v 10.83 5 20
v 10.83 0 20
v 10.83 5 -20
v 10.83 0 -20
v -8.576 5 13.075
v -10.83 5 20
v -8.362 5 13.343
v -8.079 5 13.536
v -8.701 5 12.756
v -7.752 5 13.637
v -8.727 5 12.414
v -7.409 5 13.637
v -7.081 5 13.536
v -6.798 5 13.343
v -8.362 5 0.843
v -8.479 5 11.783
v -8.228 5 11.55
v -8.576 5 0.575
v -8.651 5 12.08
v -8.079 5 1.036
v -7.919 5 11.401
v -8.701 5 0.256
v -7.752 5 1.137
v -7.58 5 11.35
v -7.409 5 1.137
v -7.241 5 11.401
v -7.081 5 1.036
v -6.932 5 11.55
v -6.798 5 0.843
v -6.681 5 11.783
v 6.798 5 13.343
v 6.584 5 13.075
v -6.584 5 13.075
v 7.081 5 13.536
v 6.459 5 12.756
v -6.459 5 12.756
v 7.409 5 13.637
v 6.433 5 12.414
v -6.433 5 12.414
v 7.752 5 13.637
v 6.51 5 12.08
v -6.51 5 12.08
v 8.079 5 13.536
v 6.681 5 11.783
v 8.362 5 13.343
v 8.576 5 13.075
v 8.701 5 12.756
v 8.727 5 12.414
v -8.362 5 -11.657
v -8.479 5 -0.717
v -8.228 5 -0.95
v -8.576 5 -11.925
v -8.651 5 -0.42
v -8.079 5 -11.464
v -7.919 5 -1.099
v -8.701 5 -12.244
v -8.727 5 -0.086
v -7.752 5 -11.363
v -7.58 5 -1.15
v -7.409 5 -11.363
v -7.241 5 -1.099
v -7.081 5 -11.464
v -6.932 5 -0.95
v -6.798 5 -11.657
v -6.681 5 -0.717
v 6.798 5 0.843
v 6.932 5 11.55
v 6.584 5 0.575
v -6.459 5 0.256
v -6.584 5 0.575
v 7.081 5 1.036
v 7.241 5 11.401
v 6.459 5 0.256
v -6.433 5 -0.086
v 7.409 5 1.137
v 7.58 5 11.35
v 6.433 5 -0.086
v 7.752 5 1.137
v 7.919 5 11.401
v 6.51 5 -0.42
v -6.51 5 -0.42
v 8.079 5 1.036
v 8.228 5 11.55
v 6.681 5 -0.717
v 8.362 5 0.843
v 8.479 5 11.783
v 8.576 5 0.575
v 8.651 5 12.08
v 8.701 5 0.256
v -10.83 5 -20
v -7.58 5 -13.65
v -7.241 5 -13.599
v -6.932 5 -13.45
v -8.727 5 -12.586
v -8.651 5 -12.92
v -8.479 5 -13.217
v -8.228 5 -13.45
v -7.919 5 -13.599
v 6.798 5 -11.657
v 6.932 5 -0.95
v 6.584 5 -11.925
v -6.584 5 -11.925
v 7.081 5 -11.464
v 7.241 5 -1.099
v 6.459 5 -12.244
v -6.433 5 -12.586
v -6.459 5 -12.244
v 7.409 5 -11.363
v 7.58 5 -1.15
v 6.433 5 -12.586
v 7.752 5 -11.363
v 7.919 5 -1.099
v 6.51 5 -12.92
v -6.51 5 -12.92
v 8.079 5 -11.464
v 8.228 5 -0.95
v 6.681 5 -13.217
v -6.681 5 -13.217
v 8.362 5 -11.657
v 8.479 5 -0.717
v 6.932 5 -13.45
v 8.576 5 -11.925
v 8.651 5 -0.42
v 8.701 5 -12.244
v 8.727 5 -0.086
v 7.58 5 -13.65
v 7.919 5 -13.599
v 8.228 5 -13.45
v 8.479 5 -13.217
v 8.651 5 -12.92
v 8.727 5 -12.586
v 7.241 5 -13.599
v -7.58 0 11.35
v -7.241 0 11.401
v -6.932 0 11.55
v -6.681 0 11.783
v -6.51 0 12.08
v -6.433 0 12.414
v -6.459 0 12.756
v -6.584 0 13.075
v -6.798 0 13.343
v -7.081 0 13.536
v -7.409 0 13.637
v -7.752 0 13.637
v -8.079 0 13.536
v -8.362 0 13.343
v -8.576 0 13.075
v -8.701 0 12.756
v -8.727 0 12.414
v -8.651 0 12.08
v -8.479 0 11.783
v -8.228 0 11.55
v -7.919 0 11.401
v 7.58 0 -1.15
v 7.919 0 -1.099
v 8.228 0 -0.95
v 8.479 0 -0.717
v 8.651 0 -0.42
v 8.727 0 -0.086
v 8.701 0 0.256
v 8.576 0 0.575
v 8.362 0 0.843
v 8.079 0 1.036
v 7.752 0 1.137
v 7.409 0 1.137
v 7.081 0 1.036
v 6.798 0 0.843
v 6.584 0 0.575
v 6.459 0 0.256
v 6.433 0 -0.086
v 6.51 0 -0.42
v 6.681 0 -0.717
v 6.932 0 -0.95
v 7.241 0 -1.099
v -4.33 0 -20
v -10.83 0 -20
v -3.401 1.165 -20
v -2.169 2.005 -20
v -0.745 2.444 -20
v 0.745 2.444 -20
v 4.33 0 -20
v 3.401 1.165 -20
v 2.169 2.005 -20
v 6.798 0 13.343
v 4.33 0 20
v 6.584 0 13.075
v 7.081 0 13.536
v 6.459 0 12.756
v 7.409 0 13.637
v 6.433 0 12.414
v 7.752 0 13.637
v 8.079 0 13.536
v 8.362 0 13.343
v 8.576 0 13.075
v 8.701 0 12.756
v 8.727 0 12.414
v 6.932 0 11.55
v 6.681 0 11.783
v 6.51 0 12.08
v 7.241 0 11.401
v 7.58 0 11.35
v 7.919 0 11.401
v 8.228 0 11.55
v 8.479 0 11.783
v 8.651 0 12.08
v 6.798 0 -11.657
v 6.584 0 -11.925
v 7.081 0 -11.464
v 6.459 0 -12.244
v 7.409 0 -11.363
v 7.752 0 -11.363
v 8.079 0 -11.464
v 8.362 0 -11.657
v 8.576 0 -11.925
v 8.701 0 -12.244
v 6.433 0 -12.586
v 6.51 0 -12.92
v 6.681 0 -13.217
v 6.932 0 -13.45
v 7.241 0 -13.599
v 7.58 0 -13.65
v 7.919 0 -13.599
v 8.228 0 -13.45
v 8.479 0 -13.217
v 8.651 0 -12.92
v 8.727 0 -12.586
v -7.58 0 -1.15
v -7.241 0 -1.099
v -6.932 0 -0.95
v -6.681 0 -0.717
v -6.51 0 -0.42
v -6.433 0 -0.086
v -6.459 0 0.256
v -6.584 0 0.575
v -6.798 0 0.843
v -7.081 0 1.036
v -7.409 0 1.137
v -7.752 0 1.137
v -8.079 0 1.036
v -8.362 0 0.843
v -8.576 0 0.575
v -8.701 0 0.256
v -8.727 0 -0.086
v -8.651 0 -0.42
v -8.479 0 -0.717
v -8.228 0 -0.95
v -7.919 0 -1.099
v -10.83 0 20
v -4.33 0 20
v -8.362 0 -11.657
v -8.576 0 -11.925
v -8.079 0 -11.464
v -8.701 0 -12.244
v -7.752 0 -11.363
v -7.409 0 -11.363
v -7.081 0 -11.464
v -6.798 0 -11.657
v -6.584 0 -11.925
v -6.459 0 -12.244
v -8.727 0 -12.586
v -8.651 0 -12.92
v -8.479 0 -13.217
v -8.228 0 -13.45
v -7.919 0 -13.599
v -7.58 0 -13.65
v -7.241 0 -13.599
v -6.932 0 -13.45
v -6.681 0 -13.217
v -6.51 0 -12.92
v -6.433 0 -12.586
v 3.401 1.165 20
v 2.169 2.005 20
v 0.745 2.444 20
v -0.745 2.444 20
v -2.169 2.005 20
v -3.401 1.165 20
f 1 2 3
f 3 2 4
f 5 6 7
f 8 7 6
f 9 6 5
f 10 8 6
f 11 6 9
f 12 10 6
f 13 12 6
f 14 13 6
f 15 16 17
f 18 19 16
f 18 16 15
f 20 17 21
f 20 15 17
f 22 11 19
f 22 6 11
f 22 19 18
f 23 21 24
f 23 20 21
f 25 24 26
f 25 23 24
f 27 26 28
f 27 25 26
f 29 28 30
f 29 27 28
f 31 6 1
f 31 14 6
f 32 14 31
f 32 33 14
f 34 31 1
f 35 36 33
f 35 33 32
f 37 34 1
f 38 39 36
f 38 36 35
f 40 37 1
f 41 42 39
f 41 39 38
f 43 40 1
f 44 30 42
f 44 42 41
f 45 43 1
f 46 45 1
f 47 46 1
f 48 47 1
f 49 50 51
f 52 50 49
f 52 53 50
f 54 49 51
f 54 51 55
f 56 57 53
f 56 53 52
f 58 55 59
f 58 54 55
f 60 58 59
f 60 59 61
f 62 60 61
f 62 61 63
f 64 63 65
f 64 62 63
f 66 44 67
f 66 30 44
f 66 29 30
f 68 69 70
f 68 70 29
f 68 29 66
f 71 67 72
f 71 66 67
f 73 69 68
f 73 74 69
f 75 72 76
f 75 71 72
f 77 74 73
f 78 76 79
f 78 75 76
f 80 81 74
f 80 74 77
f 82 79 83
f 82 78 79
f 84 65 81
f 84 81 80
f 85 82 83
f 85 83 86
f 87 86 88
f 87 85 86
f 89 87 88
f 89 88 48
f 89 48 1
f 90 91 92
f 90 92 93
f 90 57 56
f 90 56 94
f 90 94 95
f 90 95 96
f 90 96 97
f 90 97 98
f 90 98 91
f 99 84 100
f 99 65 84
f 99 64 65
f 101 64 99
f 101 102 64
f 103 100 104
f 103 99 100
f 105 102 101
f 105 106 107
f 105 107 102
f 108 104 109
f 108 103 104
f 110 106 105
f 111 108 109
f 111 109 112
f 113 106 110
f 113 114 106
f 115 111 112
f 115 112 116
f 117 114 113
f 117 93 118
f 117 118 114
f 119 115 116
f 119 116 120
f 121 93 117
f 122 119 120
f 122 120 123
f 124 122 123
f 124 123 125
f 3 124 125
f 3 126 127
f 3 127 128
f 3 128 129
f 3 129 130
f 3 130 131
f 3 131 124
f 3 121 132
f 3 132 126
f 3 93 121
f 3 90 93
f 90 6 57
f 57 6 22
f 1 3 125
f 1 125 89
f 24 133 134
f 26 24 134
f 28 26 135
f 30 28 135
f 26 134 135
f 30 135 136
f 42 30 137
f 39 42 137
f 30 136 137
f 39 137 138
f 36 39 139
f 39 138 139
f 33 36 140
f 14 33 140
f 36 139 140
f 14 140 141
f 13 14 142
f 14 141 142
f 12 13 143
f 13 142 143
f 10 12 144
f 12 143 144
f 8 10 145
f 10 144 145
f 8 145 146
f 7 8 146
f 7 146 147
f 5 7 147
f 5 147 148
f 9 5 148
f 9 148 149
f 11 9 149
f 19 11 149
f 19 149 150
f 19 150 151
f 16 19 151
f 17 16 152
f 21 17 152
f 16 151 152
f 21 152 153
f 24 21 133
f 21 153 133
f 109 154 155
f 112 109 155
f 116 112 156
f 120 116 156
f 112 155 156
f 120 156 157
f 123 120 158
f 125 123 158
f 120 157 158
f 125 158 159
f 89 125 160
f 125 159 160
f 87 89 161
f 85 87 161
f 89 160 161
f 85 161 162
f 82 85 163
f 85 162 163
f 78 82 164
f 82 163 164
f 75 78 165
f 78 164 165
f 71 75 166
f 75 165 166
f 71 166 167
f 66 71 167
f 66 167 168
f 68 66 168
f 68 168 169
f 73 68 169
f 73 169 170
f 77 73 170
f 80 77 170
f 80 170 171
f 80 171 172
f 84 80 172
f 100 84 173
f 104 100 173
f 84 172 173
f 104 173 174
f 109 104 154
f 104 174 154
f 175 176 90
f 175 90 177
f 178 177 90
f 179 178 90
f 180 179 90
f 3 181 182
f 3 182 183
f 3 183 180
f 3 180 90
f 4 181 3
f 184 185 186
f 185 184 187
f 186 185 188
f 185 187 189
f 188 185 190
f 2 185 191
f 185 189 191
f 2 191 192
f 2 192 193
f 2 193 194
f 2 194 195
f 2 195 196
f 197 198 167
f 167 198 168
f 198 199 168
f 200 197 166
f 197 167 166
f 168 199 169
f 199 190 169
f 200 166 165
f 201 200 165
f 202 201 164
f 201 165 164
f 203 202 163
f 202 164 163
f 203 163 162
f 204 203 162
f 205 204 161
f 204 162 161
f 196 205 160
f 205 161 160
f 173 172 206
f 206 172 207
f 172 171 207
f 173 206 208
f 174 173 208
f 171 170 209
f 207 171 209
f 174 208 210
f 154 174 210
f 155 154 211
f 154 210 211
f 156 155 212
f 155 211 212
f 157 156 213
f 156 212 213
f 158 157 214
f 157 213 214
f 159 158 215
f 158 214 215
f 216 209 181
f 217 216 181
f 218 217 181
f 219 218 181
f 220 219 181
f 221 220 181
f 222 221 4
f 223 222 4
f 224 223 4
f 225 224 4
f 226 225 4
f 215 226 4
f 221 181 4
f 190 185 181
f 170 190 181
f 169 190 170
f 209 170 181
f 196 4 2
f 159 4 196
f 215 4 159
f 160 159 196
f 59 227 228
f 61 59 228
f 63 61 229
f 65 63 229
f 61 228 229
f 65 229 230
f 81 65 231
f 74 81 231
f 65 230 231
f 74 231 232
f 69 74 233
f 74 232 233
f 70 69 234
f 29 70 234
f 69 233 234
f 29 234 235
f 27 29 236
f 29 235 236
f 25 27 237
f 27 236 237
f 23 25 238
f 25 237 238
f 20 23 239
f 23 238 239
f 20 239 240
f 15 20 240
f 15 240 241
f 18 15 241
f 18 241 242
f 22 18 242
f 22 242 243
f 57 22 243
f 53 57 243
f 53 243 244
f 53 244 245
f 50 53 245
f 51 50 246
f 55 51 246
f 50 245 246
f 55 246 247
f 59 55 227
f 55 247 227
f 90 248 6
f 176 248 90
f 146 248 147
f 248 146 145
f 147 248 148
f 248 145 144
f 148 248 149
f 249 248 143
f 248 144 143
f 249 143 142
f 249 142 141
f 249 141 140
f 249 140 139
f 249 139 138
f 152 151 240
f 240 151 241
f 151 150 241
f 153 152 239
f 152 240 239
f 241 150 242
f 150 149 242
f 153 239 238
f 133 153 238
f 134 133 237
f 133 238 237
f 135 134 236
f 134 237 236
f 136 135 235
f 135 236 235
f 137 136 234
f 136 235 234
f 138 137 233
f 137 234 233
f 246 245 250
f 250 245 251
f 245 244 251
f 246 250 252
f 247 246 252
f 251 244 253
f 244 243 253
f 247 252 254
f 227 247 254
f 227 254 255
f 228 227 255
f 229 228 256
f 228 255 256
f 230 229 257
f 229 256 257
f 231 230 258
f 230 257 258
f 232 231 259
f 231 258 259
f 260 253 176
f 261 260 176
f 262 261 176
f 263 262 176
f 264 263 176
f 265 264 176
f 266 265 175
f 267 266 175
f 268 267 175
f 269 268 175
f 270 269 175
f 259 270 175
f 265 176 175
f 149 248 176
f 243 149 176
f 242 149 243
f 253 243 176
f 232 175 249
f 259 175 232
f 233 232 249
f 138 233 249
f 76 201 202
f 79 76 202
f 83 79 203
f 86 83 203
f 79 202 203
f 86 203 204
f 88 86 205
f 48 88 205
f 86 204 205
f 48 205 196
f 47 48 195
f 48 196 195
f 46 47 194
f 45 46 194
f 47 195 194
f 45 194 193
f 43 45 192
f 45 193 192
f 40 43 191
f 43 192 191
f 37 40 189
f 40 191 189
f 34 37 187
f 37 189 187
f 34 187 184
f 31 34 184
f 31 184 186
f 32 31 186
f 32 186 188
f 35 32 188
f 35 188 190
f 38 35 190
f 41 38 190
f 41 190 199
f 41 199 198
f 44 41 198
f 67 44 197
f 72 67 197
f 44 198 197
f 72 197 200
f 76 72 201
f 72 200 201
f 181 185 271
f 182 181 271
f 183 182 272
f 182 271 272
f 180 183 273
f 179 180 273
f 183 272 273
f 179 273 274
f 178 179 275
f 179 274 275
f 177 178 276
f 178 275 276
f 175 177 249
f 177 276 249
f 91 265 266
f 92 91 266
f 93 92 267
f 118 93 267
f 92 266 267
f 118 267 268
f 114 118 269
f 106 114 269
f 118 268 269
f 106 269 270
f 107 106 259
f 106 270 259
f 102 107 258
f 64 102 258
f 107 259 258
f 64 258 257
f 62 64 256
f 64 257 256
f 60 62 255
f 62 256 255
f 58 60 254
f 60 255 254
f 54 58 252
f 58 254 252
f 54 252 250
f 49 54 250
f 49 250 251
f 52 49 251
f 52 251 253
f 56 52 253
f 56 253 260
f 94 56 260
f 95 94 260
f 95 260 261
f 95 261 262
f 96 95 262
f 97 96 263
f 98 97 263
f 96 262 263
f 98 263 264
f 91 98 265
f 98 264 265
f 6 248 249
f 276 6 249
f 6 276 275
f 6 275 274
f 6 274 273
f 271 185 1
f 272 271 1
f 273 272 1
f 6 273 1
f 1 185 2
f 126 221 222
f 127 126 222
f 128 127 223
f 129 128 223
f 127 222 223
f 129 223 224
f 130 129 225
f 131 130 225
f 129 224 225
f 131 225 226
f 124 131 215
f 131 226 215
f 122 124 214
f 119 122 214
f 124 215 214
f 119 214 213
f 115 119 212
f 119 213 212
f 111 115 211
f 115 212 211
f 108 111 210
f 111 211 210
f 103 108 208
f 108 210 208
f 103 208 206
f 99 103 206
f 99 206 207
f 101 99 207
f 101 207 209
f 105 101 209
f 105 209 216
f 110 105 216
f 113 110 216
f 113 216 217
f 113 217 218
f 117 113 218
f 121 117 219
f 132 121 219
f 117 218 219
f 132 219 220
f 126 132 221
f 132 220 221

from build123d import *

# Parameters (mm, degrees)
SKETCH_1_W          = 21.66025404
SKETCH_1_H          = 40
EXTRUDE_1_DEPTH     = 5
CUT_EXTRUDE_1_DEPTH = 40
SKETCH_3_R          = 1.15
CUT_EXTRUDE_2_DEPTH = 5


with BuildPart() as part:
    # Эскиз1 → Бобышка-Вытянуть1 (new body)
    with BuildSketch(Plane(origin=(0, 0, 0), x_dir=(1, 0, 0), z_dir=(0, 1, 0))):
        Rectangle(SKETCH_1_W, SKETCH_1_H)
    extrude(amount=EXTRUDE_1_DEPTH)

    # Эскиз2 → Вырез-Вытянуть1 (cut)
    with BuildSketch(Plane.XY.offset(20)):
        with BuildLine():
            Line((-4.33012702, 0), (4.33012702, 0))
            ThreePointArc((4.33012702, 0), (0, 2.500000002), (-4.33012702, 0))
        make_face()
    extrude(amount=-CUT_EXTRUDE_1_DEPTH, mode=Mode.SUBTRACT)

    # Эскиз3 → Вырез-Вытянуть2 (cut)
    with BuildSketch(Plane.XZ):
        with Locations(Location((7.58012702, 12.5, 0), (0, 0, 270))):
            Circle(SKETCH_3_R)
        with Locations(Location((7.58012702, -12.5, 0), (0, 0, 270))):
            Circle(SKETCH_3_R)
        with Locations(Location((7.58012702, 0, 0), (0, 0, 270))):
            Circle(SKETCH_3_R)
        with Locations(Location((-7.58012702, -12.5, 0), (0, 0, 270))):
            Circle(SKETCH_3_R)
        with Locations(Location((-7.58012702, 0, 0), (0, 0, 270))):
            Circle(SKETCH_3_R)
        with Locations(Location((-7.58012702, 12.5, 0), (0, 0, 270))):
            Circle(SKETCH_3_R)
    extrude(amount=-CUT_EXTRUDE_2_DEPTH, mode=Mode.SUBTRACT)


solid = part.part
